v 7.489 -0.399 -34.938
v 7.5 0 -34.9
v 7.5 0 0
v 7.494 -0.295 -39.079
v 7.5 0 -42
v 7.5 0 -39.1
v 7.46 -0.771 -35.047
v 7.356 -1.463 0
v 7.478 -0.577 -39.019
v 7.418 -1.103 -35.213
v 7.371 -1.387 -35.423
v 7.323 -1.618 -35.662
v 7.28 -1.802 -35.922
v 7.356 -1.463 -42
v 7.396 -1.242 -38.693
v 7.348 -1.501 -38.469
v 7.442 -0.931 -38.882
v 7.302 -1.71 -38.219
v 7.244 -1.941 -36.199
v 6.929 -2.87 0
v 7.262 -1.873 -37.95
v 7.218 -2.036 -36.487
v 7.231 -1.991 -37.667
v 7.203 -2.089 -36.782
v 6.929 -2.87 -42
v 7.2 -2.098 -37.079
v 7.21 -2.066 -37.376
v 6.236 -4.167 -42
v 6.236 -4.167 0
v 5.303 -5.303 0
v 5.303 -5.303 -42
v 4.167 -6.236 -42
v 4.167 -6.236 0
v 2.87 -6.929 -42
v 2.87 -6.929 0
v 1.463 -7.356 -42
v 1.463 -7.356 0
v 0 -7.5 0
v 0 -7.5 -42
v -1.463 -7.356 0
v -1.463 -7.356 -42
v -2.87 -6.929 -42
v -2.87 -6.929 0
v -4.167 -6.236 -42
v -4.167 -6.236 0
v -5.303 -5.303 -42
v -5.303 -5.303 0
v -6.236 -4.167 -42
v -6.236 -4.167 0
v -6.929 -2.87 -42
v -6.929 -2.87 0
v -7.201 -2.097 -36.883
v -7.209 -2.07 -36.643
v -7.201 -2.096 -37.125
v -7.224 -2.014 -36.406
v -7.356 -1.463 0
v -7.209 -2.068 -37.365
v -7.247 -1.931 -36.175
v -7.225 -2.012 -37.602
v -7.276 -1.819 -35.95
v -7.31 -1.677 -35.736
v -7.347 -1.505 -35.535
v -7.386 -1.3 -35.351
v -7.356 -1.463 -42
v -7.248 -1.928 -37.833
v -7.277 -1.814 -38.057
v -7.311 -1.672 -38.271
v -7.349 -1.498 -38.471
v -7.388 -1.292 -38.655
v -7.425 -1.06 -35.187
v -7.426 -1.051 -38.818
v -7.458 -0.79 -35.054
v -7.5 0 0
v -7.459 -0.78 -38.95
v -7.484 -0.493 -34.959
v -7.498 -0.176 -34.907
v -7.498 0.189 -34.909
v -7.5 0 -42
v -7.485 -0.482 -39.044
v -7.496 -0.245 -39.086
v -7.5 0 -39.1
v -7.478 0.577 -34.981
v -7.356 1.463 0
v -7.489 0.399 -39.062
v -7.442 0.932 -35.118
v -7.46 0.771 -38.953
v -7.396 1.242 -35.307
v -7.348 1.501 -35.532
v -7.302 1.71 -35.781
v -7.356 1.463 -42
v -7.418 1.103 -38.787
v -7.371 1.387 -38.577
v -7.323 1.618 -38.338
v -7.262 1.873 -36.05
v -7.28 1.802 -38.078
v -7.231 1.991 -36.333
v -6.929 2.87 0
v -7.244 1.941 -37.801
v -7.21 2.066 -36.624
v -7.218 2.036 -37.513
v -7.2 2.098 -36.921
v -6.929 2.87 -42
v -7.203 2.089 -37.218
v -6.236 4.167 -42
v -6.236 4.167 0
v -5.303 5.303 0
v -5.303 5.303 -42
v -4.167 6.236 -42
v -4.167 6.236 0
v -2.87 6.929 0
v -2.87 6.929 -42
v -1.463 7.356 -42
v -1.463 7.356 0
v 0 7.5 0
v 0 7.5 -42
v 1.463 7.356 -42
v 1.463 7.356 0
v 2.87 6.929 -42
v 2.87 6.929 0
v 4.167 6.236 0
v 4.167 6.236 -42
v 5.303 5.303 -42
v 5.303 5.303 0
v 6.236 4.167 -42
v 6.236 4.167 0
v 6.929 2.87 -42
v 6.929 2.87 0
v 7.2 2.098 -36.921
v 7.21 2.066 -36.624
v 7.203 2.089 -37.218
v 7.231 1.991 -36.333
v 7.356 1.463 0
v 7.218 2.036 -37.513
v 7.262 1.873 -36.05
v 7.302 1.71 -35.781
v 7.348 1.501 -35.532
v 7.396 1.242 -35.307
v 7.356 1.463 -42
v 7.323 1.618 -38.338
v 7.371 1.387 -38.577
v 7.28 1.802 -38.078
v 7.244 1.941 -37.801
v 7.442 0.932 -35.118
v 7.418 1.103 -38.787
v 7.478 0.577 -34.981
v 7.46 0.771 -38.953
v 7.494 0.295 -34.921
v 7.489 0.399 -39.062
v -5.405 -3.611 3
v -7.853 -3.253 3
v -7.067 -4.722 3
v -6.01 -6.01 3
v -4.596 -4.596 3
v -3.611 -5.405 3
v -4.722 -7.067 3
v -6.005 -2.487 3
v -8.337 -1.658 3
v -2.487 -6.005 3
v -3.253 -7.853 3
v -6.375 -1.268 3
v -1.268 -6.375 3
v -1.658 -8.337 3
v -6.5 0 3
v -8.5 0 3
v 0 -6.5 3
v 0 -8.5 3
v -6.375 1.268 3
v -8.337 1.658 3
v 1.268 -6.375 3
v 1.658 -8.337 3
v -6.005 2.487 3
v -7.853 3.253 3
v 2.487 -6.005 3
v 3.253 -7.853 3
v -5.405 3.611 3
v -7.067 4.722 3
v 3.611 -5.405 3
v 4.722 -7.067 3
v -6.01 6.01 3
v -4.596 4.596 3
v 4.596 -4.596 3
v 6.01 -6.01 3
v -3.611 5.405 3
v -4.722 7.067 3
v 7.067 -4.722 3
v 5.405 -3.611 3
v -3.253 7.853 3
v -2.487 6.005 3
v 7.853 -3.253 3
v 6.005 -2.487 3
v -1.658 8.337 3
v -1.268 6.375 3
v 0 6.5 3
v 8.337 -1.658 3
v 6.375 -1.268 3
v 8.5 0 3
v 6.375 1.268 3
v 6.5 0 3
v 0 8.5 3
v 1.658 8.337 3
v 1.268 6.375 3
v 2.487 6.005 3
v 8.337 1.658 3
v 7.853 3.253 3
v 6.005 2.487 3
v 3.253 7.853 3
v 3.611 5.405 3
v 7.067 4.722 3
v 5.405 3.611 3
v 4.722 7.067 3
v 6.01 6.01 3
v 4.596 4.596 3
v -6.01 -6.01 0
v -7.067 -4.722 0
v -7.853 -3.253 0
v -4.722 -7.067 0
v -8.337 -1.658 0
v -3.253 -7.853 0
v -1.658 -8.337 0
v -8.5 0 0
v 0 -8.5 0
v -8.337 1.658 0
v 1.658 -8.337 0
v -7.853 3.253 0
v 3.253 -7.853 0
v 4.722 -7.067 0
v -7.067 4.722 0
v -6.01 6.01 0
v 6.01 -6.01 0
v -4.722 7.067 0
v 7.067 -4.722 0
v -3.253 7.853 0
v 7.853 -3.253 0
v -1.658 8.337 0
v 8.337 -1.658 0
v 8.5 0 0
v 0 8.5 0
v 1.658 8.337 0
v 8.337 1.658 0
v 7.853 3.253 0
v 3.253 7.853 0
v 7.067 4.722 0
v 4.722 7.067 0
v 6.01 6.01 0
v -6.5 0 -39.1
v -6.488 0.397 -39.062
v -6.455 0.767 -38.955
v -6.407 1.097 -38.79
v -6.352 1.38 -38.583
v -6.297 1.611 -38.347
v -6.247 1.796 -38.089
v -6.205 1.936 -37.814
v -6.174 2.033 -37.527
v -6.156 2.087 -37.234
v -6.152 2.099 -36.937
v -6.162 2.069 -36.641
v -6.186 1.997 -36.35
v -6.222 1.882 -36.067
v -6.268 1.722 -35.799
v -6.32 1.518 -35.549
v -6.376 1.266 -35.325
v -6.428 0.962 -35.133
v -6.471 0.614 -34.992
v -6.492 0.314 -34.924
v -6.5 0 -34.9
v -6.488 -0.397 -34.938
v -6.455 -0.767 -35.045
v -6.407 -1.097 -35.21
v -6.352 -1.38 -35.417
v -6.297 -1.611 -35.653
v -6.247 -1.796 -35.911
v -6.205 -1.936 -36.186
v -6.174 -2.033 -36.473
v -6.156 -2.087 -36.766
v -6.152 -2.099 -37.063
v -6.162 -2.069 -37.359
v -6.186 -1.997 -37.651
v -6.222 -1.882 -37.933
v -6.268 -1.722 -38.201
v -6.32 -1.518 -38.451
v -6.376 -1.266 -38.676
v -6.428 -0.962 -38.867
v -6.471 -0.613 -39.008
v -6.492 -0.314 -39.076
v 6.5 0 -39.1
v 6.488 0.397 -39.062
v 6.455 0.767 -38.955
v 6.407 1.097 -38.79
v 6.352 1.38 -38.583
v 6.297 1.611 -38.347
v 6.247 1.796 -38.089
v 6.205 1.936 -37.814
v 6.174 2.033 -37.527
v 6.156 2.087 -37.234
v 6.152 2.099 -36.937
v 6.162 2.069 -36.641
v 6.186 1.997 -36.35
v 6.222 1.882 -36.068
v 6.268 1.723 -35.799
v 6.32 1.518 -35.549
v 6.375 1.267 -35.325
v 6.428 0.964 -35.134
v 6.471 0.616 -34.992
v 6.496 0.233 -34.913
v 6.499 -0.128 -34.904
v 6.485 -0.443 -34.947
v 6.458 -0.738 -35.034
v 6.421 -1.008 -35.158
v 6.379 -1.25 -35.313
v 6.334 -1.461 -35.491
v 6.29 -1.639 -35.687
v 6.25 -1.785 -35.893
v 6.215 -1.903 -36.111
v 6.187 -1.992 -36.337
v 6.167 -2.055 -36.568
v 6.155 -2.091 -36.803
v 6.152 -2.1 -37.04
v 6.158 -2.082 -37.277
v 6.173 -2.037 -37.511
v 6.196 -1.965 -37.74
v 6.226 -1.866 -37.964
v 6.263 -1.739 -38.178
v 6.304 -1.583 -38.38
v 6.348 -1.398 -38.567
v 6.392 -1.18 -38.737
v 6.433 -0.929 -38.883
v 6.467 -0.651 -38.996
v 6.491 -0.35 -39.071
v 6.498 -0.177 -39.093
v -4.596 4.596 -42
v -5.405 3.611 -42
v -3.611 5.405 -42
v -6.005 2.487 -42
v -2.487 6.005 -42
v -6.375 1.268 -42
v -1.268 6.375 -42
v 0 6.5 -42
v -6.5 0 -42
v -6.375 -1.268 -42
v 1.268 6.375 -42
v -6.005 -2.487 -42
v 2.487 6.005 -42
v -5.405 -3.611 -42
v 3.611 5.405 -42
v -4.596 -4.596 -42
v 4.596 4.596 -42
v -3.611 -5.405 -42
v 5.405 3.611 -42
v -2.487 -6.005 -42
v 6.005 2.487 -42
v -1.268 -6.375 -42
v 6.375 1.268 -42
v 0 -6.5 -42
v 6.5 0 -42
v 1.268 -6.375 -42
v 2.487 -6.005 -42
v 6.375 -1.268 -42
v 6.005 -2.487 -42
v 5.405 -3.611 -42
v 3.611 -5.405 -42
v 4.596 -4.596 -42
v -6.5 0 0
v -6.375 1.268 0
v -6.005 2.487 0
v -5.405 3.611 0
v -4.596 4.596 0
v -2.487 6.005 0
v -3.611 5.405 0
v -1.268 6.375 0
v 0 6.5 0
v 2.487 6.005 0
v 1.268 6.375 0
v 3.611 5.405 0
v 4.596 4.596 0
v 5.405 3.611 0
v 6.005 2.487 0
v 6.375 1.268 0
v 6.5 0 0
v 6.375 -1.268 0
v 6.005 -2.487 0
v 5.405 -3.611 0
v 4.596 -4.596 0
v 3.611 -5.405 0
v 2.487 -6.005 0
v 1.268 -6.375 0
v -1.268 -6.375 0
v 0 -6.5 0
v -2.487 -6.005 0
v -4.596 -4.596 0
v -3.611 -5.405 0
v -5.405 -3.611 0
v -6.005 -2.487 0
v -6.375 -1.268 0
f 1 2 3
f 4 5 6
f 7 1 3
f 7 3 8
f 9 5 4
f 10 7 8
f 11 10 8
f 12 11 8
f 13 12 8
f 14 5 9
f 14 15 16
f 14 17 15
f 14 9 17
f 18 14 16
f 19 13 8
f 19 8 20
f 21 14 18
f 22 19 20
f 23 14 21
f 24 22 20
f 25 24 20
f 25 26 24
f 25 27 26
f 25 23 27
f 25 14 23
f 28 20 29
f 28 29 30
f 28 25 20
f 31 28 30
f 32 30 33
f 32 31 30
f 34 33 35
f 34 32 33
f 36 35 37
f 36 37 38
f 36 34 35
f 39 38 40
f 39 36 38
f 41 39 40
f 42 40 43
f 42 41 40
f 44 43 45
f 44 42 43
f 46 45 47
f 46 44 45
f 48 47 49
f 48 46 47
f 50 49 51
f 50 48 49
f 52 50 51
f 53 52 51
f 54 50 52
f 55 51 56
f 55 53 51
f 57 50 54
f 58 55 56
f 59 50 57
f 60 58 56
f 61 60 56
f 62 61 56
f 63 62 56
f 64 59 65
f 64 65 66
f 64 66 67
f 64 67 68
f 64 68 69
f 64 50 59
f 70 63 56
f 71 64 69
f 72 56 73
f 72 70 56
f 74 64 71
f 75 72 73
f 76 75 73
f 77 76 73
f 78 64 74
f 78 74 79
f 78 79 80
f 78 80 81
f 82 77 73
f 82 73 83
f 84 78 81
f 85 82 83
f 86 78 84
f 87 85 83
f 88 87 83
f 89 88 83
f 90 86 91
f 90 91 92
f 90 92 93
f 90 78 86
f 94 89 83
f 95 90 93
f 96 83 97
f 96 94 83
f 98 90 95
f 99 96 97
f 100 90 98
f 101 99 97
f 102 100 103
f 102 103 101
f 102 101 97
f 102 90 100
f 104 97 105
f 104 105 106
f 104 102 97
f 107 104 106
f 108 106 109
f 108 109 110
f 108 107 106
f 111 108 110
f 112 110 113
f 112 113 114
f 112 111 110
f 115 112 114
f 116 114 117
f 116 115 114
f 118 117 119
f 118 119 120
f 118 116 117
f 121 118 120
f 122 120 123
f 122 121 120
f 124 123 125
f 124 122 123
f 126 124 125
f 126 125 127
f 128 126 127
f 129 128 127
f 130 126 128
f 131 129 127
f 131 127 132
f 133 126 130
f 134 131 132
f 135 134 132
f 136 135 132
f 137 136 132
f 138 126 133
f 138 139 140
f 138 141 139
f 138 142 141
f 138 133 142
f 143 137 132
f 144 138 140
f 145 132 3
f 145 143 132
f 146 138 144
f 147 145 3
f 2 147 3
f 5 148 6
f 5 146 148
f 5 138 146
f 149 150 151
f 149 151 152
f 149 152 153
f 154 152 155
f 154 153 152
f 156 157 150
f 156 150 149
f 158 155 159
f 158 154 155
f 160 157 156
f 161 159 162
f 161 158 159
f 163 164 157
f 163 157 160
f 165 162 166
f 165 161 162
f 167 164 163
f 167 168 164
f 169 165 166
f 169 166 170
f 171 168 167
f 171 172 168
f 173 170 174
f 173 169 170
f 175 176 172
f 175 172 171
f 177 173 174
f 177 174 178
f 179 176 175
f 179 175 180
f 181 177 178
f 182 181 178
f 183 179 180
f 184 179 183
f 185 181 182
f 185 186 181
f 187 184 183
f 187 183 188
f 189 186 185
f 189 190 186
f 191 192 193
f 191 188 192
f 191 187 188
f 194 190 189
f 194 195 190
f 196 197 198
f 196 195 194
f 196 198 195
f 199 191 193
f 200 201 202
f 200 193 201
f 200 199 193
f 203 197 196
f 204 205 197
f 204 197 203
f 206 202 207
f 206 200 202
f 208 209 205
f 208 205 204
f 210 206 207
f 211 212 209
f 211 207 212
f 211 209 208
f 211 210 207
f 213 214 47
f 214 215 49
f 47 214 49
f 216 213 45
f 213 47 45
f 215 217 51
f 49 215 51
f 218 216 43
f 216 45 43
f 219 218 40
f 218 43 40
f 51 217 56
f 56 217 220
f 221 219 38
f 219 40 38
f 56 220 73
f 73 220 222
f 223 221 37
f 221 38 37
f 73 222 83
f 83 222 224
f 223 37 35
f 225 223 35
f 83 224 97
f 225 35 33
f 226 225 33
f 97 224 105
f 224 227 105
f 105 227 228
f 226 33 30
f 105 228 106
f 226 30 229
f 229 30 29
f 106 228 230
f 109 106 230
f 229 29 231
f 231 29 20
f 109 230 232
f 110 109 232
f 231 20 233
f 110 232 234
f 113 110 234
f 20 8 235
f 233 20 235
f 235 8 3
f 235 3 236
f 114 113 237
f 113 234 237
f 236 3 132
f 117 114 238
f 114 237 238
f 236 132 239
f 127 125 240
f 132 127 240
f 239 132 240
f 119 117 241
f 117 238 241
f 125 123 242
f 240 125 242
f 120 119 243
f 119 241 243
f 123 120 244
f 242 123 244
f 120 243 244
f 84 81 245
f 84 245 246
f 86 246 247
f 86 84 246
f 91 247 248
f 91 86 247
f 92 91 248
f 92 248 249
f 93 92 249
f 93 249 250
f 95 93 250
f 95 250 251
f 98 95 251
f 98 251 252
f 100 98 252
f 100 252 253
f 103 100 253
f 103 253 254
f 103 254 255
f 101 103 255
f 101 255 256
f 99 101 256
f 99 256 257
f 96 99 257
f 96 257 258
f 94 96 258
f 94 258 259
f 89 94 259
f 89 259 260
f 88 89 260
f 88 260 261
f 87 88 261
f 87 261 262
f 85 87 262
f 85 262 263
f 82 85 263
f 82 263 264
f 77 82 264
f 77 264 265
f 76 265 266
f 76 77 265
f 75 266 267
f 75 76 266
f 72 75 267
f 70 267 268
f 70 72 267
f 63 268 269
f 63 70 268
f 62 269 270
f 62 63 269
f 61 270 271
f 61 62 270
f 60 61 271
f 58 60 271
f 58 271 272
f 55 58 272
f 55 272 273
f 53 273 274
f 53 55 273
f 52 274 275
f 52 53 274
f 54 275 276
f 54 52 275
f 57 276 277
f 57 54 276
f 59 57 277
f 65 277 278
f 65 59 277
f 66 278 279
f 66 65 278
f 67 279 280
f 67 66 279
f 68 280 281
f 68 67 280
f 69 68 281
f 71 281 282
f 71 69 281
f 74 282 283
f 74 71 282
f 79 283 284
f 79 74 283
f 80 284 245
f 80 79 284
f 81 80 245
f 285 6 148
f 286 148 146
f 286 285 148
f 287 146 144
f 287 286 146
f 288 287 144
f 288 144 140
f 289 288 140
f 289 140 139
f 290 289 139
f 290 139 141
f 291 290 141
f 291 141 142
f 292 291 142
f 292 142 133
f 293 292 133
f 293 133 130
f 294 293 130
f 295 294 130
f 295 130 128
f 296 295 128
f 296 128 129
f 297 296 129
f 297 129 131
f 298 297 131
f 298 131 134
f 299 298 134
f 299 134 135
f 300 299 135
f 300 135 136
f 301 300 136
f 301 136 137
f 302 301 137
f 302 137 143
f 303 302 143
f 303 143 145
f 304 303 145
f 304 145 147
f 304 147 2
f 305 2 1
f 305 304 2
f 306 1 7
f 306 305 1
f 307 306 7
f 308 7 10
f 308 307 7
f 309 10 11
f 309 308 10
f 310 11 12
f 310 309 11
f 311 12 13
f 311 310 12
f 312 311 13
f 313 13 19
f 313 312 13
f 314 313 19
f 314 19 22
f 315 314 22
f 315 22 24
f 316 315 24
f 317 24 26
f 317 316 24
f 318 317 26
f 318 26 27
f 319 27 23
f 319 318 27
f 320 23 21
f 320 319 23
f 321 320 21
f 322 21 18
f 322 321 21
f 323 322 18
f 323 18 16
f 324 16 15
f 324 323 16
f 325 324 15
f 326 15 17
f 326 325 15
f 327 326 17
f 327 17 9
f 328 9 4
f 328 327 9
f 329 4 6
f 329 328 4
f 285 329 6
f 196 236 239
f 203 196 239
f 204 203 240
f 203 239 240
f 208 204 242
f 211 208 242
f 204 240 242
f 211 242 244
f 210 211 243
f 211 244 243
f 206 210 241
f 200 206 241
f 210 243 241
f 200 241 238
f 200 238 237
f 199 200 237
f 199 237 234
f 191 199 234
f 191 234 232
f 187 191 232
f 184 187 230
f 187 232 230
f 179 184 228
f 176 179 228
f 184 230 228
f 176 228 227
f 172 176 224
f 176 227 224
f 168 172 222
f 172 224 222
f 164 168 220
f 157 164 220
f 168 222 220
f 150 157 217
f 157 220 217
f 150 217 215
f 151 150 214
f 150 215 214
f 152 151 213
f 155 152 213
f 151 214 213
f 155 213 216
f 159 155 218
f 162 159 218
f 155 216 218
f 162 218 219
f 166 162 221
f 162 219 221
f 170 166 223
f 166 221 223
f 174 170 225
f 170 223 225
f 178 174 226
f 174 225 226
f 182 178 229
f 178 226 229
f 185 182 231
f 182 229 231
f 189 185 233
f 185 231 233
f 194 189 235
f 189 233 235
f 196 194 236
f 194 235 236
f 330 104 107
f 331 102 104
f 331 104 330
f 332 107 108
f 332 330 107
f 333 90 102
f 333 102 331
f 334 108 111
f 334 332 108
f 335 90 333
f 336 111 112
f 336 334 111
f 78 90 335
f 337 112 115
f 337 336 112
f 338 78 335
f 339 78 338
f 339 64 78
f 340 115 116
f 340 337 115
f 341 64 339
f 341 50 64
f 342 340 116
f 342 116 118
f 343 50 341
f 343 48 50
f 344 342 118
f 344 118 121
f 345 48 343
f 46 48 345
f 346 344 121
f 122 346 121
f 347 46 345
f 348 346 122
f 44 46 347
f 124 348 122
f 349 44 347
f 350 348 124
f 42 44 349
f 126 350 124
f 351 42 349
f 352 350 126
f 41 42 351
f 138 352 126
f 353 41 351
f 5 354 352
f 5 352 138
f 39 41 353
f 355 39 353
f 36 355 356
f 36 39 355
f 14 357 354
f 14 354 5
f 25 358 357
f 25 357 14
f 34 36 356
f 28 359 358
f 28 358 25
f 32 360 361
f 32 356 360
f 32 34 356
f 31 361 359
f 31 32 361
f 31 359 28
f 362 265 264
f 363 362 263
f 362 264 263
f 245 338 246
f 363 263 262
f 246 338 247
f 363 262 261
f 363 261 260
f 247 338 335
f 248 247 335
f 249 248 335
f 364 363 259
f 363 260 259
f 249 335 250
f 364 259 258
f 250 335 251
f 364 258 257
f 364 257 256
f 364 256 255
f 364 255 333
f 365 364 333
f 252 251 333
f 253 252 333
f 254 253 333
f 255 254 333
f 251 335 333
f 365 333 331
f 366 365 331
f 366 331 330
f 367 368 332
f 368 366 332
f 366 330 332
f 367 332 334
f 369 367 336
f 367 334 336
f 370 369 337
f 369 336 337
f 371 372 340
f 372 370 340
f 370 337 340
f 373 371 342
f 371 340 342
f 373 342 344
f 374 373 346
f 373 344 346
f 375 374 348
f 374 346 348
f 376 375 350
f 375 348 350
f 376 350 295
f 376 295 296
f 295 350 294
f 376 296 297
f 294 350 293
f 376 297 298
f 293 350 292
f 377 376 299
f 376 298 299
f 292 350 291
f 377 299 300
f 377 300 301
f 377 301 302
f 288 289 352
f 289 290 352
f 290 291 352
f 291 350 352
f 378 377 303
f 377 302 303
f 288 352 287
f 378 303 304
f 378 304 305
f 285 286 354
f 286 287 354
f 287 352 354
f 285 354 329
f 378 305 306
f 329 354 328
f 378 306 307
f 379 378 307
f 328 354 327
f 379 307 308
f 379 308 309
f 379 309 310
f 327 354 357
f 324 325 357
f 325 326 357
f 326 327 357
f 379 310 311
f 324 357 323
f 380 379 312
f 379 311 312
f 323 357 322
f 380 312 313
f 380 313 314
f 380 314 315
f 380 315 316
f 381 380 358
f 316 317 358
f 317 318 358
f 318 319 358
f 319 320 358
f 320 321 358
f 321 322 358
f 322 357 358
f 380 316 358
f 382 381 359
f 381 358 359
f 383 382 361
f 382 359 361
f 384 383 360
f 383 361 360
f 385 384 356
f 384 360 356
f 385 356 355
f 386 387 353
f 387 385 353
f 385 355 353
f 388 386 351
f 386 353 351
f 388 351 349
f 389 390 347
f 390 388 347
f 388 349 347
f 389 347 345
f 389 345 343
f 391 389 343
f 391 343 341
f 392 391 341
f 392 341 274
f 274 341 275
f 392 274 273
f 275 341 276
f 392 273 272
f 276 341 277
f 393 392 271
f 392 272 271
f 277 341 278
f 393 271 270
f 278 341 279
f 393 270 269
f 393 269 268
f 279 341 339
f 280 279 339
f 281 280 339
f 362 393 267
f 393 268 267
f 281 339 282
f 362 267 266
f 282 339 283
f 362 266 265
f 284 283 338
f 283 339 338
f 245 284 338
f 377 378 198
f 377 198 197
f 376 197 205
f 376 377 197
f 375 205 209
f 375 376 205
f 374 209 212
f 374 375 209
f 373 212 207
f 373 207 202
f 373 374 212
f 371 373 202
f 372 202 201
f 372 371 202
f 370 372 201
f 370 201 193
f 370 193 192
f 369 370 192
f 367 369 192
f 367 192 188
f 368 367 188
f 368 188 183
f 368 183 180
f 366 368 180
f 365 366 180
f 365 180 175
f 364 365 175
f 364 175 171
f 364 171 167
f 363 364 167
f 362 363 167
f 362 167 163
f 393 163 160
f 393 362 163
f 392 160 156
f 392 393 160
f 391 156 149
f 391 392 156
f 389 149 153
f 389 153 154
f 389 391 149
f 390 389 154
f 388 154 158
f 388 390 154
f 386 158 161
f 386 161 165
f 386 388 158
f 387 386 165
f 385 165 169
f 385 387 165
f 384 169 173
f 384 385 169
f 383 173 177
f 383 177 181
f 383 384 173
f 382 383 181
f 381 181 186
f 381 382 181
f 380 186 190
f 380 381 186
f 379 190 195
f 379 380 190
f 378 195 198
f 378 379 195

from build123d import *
from build123d.topology import SkipClean

# Parameters (mm, degrees)
ESBO_O1_R                  = 8.5
ESBO_O1_R_2                = 6.5
RESSALTO_EXTRUS_O1_DEPTH   = 3
RESSALTO_EXTRUS_O3_START   = 42
ESBO_O3_R                  = 7.5
ESBO_O3_R_2                = 6.5
RESSALTO_EXTRUS_O3_DEPTH   = 42
CORTE_EXTRUS_O1_DEPTH      = 44.686382318
CORTE_EXTRUS_O1_DEPTH_BACK = 44.686382318
ESBO_O4_R                  = 2.1


with BuildPart() as part:
    # Esboço1 → Ressalto-extrusão1 (new body)
    with BuildSketch(Plane.XY):
        Circle(ESBO_O1_R)
        Circle(ESBO_O1_R_2, mode=Mode.SUBTRACT)
    extrude(amount=RESSALTO_EXTRUS_O1_DEPTH)

    # Esboço3 → Ressalto-extrusão3 (add)
    with SkipClean():  # the faces are left unmerged after this step: merging them gives an invalid solid
        with BuildSketch(Plane(origin=(0, 0, 0), x_dir=(-1, 0, 0), z_dir=(0, 0, -1)).offset(RESSALTO_EXTRUS_O3_START)):
            with Locations(Location((0, 0, 0), (0, 0, 180))):
                Circle(ESBO_O3_R)
            Circle(ESBO_O3_R_2, mode=Mode.SUBTRACT)
        extrude(amount=-RESSALTO_EXTRUS_O3_DEPTH)

    # Esboço4 → Corte-extrusão1 (cut, two sides: drawn at the far end of the back side and taken through both)
    with SkipClean():  # the faces are left unmerged after this step: merging them gives an invalid solid
        with BuildSketch(Plane(origin=(0, 0, 0), x_dir=(0, 0, -1), z_dir=(1, 0, 0)).offset(-CORTE_EXTRUS_O1_DEPTH_BACK)):
            with Locations((37, 0)):
                Circle(ESBO_O4_R)
        extrude(amount=CORTE_EXTRUS_O1_DEPTH + CORTE_EXTRUS_O1_DEPTH_BACK, mode=Mode.SUBTRACT)


solid = part.part
